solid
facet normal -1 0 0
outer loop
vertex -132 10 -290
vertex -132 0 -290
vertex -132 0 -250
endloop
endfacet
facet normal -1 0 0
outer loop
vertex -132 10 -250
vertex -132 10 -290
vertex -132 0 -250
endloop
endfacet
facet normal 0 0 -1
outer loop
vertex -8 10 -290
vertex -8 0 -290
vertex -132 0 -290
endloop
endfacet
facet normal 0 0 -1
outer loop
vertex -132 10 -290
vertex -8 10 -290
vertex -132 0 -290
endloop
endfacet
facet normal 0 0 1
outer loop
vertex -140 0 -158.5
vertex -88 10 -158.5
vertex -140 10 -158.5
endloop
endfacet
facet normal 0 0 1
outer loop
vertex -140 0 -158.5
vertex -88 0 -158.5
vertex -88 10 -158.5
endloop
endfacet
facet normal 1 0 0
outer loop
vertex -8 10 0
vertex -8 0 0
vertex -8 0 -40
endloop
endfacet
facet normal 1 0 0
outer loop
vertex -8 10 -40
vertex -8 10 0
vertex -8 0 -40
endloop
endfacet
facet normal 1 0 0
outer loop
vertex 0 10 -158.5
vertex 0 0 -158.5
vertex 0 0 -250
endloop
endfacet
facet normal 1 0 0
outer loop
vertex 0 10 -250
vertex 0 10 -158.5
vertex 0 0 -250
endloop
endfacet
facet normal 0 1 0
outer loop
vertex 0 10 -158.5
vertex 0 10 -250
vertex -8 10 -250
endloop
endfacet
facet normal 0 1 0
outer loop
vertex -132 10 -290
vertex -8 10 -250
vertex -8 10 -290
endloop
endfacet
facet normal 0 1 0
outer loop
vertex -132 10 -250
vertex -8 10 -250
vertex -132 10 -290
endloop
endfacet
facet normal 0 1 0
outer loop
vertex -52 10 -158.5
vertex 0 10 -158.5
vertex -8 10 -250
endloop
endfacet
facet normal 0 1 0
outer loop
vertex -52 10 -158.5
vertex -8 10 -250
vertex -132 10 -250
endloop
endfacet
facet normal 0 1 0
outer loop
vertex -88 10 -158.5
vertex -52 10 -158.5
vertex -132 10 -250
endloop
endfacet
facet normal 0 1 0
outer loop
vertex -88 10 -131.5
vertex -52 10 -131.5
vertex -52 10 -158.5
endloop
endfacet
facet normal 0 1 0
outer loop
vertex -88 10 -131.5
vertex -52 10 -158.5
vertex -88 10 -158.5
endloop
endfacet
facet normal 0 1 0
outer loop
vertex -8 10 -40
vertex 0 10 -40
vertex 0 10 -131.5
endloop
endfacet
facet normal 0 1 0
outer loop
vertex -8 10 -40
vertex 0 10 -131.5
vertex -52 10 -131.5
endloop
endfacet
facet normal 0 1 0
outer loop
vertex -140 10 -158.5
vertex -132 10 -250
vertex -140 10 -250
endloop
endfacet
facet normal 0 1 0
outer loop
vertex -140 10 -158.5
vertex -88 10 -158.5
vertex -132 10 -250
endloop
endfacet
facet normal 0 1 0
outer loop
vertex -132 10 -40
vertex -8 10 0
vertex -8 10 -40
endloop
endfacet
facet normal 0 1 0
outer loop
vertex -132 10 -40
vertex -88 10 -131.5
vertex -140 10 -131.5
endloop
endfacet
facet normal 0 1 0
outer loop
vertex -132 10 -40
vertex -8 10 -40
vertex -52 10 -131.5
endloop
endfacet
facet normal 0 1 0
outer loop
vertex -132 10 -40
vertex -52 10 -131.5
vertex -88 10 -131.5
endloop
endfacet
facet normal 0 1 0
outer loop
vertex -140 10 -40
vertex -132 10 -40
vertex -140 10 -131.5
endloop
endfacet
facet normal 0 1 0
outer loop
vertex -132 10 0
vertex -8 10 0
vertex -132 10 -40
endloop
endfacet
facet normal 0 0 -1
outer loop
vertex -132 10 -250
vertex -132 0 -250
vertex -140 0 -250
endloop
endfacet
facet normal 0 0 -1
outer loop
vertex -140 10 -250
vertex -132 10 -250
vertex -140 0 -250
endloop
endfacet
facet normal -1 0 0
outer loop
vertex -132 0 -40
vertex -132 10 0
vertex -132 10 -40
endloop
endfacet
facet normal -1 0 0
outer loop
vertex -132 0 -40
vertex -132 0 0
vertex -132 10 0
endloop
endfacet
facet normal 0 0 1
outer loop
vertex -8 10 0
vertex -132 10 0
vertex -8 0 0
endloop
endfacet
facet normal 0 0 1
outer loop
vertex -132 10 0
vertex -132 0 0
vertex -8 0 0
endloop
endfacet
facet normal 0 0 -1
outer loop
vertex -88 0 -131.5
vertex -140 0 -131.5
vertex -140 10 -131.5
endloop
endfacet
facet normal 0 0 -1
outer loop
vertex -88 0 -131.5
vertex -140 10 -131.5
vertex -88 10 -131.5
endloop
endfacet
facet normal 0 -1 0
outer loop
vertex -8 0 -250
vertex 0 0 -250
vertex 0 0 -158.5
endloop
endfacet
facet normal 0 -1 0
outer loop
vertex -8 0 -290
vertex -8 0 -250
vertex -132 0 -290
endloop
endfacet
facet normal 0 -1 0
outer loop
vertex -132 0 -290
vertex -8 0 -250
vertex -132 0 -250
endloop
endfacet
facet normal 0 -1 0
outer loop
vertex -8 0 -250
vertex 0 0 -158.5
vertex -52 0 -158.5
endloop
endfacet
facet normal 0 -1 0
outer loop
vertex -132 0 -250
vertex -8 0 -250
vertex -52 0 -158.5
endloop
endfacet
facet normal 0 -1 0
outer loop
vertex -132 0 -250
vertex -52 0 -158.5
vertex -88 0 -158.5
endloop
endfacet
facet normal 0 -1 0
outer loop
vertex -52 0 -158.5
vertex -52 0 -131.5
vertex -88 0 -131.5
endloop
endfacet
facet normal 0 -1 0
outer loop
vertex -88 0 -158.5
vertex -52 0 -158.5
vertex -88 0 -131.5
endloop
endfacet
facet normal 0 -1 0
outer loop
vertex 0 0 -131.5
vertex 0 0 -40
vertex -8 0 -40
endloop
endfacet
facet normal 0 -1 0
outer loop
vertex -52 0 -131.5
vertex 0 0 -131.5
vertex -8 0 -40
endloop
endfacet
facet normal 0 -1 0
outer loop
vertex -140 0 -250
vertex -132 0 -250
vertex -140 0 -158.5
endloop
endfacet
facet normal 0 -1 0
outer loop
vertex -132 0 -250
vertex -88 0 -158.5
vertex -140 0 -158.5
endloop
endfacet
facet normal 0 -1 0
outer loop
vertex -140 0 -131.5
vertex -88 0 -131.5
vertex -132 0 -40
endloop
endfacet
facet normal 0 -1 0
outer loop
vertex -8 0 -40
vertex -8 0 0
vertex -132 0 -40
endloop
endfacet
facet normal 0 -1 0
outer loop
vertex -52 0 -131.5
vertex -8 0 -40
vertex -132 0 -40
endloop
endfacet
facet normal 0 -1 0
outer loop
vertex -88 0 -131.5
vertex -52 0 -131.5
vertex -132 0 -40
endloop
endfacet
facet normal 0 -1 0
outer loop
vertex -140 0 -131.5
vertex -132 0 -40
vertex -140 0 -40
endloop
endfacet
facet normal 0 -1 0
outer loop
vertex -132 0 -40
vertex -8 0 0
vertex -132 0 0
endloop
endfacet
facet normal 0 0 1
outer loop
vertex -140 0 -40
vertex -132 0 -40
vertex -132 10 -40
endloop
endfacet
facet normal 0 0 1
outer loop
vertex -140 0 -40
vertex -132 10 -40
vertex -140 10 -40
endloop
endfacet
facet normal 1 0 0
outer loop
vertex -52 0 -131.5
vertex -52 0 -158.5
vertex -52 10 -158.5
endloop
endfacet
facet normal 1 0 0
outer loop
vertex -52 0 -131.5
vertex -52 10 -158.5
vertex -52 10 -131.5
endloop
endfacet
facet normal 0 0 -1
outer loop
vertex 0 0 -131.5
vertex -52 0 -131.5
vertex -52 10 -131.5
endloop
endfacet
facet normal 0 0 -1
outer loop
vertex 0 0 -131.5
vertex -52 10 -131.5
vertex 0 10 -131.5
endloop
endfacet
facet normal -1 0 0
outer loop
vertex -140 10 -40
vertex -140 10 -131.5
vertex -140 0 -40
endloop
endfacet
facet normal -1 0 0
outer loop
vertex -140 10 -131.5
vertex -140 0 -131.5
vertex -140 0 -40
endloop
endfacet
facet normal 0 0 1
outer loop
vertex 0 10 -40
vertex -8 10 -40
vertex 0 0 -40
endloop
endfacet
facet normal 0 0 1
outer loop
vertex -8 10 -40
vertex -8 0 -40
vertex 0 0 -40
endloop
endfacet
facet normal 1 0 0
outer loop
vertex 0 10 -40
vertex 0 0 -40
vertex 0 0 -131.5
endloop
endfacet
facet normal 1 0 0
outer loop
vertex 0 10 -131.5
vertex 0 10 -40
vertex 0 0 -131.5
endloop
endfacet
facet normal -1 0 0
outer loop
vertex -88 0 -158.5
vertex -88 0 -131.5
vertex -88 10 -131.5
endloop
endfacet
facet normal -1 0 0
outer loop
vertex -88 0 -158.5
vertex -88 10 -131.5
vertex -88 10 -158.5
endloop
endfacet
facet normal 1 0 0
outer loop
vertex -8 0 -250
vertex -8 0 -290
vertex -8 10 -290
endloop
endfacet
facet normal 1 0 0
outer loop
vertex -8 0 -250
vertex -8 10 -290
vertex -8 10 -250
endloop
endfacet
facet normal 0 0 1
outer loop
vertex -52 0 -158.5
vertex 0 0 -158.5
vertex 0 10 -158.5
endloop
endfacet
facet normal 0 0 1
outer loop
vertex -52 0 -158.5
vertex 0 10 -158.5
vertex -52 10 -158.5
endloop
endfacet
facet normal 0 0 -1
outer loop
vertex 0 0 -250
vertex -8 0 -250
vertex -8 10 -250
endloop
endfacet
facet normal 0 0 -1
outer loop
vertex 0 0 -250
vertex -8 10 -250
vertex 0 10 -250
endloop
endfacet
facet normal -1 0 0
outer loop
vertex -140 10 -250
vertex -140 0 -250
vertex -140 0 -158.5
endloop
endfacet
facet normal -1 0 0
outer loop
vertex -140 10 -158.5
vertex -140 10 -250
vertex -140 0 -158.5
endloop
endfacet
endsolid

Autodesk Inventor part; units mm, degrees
ref_plane "YZ Plane" through (0, 0, 0) normal (1, 0, 0) x (0, 1, 0)
ref_plane "XZ Plane" through (0, 0, 0) normal (0, 1, 0) x (-1, 0, 0)
ref_plane "XY Plane" through (0, 0, 0) normal (0, 0, 1) x (1, 0, 0)
sketch "草圖1" plane through (0, 0, 0) normal (0, 1, 0) x (-1, 0, 0)
  line L0 (140, 0) -> (0, 0)
  line L1 (0, 0) -> (0, -290)
  line L2 (0, -290) -> (140, -290)
  line L3 (140, -290) -> (140, 0)
  line L4 (0, 0) -> (8, 0)
  line L5 (8, 0) -> (8, -40)
  line L6 (8, -40) -> (0, -40)
  line L7 (0, -40) -> (0, 0)
  line L8 (140, 0) -> (132, 0)
  line L9 (132, 0) -> (132, -40)
  line L10 (132, -40) -> (140, -40)
  line L11 (140, -40) -> (140, 0)
  line L12 (140, -290) -> (132, -290)
  line L13 (132, -290) -> (132, -250)
  line L14 (132, -250) -> (140, -250)
  line L15 (140, -250) -> (140, -290)
  line L16 (0, -290) -> (8, -290)
  line L17 (8, -290) -> (8, -250)
  line L18 (8, -250) -> (0, -250)
  line L19 (0, -250) -> (0, -290)
  line L20 (140, -131.5) -> (88, -131.5)
  line L21 (88, -131.5) -> (88, -158.5)
  line L22 (88, -158.5) -> (140, -158.5)
  line L23 (140, -158.5) -> (140, -131.5)
  line L24 (52, -131.5) -> (0, -131.5)
  line L25 (0, -131.5) -> (0, -158.5)
  line L26 (0, -158.5) -> (52, -158.5)
  line L27 (52, -158.5) -> (52, -131.5)
  point P0 (140, -145)
  point P1 (0, -145)
  point P2 (0, -40)
  point P3 (0, -131.5)
  point P4 (0, -158.5)
  point P5 (0, -250)
  point P6 (132, -290)
  dimension "d0" = 140
  dimension "d1" = 290
  dimension "d2" = 8
  dimension "d3" = 40
  dimension "d4" = 52
  dimension "d5" = 27
extrude "擠出1" add sketch "草圖1" along normal blind 10 contours L9 L10 L3 L20 L21 L22 L14 L13 L2 L17 L18 L1 L26 L27 L24 L6 L5 L0
properties part number "plate"
